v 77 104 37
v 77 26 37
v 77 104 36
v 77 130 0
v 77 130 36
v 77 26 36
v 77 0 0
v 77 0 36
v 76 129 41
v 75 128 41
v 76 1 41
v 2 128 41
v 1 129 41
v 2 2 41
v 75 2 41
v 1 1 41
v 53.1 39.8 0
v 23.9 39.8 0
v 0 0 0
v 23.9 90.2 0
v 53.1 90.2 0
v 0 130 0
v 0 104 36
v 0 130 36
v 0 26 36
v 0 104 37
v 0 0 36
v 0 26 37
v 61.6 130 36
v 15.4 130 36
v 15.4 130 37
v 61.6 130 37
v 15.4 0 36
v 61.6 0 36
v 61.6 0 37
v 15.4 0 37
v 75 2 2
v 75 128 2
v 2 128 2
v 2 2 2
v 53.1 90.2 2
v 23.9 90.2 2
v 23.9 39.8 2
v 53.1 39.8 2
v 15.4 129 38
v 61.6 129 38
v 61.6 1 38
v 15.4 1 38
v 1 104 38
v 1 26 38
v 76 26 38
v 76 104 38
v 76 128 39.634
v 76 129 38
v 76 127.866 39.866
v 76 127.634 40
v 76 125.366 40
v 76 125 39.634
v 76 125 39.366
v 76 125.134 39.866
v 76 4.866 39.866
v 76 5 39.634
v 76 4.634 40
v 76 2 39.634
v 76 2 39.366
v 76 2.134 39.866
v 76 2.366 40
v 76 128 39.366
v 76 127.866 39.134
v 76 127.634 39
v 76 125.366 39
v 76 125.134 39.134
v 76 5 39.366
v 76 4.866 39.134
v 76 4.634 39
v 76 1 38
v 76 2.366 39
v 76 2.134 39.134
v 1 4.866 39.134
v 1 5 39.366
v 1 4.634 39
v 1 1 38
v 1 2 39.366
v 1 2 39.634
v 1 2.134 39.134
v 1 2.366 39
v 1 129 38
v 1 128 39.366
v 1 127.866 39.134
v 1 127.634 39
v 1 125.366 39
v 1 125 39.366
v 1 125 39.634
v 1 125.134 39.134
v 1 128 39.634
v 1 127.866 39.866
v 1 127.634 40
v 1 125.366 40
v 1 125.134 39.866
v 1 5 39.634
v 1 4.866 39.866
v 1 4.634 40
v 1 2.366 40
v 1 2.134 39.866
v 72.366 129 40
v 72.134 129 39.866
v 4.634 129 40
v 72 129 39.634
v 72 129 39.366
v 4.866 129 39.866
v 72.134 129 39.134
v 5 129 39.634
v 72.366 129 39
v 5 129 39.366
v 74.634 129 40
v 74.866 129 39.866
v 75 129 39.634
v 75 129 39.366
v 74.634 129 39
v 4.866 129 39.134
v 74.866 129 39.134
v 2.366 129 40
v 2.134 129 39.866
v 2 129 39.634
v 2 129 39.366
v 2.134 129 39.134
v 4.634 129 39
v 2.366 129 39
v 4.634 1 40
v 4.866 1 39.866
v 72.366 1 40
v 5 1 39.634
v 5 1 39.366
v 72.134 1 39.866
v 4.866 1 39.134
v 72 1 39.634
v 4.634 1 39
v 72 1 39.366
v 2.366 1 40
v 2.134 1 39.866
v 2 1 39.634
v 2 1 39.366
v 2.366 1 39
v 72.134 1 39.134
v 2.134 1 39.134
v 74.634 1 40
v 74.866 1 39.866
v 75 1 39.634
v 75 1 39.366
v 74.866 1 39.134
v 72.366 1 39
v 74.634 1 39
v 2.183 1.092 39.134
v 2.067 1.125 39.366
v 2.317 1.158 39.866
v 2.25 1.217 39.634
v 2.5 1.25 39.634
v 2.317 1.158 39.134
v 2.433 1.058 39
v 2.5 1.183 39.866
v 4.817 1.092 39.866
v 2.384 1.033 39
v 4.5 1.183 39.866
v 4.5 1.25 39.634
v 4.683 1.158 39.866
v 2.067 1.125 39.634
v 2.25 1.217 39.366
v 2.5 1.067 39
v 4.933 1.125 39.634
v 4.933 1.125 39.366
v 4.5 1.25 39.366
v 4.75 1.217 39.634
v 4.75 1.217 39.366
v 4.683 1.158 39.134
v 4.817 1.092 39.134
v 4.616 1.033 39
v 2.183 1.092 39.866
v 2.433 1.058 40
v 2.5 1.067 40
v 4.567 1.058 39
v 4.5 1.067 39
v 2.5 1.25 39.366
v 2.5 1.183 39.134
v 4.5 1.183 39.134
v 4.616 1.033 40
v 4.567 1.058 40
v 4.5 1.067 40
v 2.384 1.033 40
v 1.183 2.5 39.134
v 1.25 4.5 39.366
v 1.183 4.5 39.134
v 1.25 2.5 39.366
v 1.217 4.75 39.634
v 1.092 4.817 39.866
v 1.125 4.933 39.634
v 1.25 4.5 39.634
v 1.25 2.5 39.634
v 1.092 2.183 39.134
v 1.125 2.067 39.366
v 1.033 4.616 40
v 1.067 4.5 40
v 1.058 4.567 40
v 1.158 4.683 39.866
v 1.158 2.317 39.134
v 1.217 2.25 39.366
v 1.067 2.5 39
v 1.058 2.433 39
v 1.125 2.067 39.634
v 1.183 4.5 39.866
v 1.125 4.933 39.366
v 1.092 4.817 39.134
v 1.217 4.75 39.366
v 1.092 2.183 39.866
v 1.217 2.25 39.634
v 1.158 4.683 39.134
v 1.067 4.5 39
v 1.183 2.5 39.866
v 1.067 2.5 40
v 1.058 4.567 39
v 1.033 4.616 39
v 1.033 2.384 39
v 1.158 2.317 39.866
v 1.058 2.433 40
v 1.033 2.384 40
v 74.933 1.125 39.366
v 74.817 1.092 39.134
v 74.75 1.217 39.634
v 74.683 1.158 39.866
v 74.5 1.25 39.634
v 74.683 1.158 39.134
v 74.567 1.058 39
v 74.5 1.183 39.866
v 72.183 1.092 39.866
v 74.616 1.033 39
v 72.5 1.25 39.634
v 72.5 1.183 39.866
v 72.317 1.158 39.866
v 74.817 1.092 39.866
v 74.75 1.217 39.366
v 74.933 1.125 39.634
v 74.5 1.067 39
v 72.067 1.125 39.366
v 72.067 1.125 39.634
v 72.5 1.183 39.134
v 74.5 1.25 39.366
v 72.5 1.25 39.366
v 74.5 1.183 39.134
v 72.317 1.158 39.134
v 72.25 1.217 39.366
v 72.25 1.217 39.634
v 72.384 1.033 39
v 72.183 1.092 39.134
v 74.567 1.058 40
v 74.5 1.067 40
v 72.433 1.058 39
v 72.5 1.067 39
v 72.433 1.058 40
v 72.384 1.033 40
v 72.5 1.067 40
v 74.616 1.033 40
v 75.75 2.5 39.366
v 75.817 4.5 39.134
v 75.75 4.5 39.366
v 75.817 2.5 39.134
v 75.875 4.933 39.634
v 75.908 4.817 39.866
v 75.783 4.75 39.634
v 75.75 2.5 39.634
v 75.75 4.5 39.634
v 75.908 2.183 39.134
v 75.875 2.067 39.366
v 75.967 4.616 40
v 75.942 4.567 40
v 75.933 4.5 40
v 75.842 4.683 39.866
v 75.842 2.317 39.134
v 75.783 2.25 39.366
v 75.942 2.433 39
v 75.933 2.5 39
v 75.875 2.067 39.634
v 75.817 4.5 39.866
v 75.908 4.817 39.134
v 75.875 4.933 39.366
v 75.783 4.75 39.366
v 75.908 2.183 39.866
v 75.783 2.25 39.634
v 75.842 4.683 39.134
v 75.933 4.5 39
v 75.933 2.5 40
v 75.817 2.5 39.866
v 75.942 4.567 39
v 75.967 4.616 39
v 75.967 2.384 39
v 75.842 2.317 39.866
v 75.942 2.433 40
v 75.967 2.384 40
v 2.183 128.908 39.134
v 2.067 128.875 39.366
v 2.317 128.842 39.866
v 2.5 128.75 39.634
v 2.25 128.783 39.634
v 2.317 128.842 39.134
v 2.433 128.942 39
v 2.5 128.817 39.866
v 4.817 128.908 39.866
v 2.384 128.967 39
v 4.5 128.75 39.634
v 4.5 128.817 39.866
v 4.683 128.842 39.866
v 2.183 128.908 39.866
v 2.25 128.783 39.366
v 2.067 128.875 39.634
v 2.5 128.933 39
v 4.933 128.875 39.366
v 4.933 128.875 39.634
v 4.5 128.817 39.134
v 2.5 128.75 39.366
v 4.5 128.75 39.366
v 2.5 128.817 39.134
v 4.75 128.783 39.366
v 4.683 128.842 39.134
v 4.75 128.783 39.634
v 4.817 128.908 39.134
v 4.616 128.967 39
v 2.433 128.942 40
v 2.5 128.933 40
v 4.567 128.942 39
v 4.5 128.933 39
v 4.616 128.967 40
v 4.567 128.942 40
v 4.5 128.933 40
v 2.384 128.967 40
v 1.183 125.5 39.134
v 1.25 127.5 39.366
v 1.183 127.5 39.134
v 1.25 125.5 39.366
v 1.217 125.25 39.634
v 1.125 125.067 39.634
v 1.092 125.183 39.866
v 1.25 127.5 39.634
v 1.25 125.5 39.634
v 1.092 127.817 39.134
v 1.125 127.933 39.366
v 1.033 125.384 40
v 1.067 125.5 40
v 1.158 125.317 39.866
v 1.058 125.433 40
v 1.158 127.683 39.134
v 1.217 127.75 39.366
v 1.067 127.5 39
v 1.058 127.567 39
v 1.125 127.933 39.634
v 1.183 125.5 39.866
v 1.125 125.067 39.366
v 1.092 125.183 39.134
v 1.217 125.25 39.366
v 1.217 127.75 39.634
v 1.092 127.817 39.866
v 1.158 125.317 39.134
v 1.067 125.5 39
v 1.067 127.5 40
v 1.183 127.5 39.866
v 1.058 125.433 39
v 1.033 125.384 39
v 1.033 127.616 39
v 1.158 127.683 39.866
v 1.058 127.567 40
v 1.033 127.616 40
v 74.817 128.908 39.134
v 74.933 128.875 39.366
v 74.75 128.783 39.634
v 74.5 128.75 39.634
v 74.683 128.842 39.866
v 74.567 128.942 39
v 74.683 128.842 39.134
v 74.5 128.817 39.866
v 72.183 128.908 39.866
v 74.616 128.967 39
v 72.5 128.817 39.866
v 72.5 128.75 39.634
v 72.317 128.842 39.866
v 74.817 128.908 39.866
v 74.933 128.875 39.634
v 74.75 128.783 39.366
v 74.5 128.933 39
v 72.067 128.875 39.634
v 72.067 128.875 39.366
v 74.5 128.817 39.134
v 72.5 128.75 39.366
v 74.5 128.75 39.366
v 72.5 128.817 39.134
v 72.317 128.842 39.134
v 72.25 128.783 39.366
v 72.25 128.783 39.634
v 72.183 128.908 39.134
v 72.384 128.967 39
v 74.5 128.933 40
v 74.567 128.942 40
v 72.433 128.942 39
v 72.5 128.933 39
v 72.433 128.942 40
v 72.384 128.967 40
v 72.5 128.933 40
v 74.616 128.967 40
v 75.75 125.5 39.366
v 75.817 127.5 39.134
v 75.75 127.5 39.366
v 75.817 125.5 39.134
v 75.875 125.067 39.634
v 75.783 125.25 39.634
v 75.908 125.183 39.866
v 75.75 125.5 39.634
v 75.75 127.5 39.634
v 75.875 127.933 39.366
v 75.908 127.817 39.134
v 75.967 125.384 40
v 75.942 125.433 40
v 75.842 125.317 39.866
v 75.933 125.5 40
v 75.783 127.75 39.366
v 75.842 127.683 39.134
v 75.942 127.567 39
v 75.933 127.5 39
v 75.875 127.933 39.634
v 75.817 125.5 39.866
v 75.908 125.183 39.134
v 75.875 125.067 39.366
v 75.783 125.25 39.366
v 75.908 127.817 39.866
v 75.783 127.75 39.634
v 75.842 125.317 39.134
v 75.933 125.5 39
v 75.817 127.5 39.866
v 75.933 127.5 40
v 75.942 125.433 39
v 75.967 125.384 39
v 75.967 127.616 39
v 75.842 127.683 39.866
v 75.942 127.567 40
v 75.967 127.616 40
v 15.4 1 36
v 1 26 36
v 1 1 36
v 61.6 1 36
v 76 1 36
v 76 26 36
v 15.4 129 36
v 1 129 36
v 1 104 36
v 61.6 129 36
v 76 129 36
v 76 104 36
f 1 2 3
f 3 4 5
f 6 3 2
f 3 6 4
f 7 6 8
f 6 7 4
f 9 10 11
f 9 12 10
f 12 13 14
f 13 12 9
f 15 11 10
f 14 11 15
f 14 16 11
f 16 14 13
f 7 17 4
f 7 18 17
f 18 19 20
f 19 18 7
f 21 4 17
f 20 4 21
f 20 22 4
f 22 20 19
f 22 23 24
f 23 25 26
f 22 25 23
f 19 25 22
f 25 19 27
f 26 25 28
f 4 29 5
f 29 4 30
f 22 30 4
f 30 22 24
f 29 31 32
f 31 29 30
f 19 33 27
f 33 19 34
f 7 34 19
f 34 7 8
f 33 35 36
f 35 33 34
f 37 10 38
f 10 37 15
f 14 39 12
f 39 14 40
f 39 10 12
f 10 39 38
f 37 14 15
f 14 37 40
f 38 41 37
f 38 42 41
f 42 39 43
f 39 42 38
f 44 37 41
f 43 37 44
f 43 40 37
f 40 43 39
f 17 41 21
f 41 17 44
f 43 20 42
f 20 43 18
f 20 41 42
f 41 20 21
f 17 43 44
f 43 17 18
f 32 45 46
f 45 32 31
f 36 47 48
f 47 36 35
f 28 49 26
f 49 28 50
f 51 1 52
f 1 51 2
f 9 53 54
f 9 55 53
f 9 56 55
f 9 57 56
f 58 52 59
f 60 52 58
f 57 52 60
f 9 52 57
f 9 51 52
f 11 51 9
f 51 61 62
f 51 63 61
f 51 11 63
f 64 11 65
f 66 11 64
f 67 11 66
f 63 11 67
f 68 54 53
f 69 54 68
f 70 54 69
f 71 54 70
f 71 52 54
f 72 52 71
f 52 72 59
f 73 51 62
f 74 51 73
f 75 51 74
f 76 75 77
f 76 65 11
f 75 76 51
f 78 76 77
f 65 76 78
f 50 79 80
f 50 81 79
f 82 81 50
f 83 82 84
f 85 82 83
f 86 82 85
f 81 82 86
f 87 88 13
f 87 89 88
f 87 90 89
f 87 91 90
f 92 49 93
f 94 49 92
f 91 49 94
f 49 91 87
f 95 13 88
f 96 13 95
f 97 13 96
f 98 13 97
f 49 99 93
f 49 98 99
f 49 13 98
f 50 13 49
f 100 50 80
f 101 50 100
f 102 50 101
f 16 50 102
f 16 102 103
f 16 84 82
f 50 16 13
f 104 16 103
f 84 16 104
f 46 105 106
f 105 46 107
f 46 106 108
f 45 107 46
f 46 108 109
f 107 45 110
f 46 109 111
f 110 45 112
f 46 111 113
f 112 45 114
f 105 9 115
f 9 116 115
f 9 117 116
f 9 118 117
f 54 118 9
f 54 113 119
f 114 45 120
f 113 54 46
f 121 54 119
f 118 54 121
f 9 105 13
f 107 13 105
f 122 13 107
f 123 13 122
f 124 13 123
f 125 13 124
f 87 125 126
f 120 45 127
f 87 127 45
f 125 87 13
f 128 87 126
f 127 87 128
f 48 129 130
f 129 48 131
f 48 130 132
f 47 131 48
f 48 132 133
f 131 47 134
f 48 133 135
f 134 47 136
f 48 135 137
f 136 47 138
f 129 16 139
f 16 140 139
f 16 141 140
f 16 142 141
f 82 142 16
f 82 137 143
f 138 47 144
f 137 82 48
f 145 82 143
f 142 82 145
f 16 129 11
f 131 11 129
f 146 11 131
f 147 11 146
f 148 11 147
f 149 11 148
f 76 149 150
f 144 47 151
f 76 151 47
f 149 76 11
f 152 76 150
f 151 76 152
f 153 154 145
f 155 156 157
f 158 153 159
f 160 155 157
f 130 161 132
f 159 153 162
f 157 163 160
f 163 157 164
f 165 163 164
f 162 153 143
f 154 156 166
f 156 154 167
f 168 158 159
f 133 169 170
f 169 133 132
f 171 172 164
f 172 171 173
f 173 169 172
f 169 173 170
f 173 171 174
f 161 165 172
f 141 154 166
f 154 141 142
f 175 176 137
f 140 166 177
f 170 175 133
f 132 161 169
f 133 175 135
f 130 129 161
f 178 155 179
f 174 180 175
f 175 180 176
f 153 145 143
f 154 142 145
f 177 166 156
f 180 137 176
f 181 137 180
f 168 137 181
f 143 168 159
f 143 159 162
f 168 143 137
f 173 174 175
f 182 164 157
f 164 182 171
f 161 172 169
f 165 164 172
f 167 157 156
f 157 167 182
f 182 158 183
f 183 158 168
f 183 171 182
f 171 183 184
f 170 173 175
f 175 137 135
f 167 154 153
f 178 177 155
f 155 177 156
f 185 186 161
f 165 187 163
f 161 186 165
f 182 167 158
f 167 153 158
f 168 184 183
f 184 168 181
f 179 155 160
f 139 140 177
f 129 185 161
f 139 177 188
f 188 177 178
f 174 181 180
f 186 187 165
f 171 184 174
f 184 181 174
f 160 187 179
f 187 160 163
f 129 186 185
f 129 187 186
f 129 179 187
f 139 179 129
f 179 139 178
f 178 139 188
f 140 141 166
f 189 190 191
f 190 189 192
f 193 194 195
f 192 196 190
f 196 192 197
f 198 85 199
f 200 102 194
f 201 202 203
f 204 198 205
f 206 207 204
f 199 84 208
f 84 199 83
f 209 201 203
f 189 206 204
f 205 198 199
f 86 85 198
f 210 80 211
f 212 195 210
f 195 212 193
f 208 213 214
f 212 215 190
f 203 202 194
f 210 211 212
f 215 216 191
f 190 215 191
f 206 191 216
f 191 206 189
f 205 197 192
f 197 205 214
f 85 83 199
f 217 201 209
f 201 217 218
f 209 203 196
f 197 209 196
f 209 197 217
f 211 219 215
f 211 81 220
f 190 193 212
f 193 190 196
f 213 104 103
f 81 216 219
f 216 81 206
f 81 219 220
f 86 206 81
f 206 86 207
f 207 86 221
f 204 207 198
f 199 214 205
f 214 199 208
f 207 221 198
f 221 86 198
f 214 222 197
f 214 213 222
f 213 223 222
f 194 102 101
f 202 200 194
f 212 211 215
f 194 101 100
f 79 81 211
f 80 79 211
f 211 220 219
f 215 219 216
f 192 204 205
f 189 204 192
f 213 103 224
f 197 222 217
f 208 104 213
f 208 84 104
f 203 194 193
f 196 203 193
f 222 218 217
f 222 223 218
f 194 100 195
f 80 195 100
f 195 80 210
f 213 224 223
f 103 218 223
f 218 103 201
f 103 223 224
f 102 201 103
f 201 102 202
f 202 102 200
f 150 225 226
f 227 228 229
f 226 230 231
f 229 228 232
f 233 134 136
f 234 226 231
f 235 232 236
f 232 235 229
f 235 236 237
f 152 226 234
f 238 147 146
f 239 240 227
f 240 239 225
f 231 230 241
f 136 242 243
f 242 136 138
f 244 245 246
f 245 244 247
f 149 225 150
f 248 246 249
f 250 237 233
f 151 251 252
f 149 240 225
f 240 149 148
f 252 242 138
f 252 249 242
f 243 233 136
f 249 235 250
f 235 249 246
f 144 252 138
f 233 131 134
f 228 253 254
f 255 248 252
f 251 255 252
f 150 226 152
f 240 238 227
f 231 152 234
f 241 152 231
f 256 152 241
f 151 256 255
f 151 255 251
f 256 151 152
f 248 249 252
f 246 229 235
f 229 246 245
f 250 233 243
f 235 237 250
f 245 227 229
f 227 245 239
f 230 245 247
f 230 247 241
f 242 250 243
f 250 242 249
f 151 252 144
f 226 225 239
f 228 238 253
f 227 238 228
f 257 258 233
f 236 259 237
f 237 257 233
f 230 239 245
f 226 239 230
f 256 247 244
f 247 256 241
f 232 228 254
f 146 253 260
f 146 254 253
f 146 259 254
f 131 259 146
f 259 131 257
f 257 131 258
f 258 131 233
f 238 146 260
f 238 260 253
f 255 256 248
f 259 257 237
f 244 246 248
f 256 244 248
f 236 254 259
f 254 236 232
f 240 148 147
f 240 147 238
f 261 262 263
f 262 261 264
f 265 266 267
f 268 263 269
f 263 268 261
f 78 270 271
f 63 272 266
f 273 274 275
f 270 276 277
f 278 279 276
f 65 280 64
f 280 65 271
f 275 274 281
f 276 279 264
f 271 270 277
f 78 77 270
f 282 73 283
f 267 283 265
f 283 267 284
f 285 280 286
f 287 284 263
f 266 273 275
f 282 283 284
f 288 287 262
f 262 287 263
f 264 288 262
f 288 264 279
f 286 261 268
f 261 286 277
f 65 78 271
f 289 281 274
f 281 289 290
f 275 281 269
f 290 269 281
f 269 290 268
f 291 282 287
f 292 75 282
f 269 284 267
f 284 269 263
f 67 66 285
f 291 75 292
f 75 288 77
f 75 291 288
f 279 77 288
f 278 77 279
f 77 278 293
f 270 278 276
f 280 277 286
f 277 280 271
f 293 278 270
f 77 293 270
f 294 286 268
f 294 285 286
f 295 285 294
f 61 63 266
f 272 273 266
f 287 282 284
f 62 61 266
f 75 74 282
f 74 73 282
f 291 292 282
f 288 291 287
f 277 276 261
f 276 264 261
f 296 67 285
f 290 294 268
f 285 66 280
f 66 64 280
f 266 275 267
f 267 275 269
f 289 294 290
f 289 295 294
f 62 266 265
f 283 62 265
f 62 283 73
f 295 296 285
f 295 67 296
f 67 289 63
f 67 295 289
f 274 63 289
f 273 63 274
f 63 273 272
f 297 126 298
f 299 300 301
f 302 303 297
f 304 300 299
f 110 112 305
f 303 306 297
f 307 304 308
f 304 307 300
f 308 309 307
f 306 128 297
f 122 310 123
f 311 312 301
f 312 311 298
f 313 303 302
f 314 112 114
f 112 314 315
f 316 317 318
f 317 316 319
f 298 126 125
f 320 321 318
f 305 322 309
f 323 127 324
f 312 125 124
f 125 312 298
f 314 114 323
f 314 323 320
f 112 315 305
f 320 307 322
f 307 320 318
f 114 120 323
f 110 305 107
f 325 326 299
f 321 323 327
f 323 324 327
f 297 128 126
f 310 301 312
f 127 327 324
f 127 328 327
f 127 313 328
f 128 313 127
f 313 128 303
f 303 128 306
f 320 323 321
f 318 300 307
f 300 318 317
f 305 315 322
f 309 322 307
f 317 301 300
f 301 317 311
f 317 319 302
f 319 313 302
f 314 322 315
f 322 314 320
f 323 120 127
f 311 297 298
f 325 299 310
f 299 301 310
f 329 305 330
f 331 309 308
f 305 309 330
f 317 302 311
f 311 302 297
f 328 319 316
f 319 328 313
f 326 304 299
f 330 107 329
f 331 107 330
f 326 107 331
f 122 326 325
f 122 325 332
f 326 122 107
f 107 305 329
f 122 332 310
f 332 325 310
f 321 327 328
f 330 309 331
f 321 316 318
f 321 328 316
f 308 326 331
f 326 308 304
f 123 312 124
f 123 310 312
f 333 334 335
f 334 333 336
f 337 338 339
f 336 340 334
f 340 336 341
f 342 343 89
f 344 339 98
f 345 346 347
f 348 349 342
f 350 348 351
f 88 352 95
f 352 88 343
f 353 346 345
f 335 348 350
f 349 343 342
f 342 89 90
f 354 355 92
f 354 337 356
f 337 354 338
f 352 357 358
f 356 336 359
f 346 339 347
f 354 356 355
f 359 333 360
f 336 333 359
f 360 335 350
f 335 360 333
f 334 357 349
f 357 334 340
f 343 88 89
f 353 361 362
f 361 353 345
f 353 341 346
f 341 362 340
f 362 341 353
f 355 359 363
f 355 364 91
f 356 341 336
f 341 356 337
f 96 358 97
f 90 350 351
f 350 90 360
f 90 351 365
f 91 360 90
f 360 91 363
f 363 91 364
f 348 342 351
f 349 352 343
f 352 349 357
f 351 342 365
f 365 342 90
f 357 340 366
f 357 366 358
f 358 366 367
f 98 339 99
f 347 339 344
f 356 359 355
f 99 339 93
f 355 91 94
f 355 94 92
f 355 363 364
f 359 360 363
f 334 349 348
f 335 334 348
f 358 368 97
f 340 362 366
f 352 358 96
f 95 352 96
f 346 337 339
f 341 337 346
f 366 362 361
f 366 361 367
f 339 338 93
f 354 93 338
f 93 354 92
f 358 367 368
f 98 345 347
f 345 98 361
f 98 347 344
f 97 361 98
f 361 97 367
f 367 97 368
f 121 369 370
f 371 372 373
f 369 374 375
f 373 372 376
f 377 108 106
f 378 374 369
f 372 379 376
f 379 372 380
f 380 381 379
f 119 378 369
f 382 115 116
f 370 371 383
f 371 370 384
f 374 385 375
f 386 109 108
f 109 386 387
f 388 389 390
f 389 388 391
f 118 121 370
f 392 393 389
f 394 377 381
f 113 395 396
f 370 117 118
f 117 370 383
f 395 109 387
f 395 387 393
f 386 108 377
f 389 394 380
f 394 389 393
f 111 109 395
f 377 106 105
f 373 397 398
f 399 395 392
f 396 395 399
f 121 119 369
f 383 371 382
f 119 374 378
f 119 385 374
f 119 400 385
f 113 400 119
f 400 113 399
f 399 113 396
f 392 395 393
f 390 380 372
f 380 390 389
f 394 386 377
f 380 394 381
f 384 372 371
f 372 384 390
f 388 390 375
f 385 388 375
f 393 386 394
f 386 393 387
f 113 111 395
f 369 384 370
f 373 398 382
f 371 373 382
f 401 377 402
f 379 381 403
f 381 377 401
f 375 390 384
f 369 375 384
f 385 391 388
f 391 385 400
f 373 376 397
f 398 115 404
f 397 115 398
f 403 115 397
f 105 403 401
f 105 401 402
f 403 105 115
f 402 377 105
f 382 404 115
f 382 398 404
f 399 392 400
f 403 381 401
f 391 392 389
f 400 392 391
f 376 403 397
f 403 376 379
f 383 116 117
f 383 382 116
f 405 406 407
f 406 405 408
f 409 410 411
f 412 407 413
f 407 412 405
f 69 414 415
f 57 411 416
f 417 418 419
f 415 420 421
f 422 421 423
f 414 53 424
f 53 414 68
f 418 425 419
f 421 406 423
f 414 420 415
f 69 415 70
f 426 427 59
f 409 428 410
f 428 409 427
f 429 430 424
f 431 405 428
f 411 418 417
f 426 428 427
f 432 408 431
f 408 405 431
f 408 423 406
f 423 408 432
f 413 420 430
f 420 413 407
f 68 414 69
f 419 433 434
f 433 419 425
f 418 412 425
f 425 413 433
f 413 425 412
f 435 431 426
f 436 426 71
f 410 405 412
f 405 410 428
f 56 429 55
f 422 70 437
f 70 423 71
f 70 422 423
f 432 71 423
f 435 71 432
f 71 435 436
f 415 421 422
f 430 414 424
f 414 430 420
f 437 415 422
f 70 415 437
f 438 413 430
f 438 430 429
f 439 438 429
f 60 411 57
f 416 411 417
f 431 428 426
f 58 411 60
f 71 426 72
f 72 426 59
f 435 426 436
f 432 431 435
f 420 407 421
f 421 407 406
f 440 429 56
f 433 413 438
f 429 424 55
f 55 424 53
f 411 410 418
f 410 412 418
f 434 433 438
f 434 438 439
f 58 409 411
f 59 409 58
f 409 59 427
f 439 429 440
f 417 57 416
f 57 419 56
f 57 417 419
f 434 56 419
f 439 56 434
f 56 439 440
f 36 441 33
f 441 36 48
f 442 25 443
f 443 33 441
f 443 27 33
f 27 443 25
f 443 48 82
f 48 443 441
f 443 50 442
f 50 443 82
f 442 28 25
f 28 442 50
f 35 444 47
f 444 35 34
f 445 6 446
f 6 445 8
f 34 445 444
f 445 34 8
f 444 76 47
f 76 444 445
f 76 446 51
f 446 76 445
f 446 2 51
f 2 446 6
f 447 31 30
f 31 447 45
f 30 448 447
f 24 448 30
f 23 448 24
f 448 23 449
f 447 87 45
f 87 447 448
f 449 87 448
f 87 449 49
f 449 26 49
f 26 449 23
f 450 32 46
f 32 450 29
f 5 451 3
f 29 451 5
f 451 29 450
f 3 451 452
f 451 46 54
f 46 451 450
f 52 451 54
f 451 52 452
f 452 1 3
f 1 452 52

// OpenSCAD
insert_font = "Futura:style=Medium";

include <../../The-Boardgame-Insert-Toolkit/boardgame_insert_toolkit_lib.2.scad>;
include <../../BFD-Insert-Extensions/InsertExtensions.scad>;

$fn = 100;


// Used to visualize how all of the boxes fit together. 
//g_b_visualization = true;          
        
// this is the outer wall thickness. 
//Default = 1.5mm
g_wall_thickness = 2.0;
g_lid_thickness = 2.0;
g_min_bottom_thickness = 1.0;


// The tolerance value is extra space put between planes of the lid and box that fit together.
// Increase the tolerance to loosen the fit and decrease it to tighten it.
//
// Note that the tolerance is applied exclusively to the lid.
// So if the lid is too tight or too loose, change this value ( up for looser fit, down for tighter fit ) and 
// you only need to reprint the lid.
// 
// The exception is the stackable box, where the bottom of the box is the lid of the box below,
// in which case the tolerance also affects that box bottom.
//
g_tolerance = 0.15;

// This adjusts the position of the lid detents downward. 
// The larger the value, the bigger the gap between the lid and the box.
g_tolerance_detents_pos = 0.1;

card_sizes = [[67,92],[73,126]];
card_width = 68;
card_height = 91;

function tents() = 
 [   "Tents",
        [
            [ BOX_SIZE_XYZ,                                     [71, 37, 7.5] ],
            boxLid(["Tents"], 10, 0, 12),
            [ BOX_COMPONENT,
                [
                    
                    [CMP_NUM_COMPARTMENTS_XY,               [1,1]],
                    [CMP_COMPARTMENT_SIZE_XYZ,              [ 33, 33, 5.5] ],
                    [CMP_SHAPE,                             SQUARE],   
                    [ POSITION_XY,                          [0, 0 ] ],
                    [CMP_CUTOUT_SIDES_4B,                   [t,f,f,f]],
                    [ LABEL,
                        [
                            [ LBL_TEXT,     "Tent" ],
                            [ LBL_SIZE,     5],
                            [ ROTATION,     0 ],
                            [ LBL_FONT,     insert_font],
                            [ POSITION_XY,   [0,0]]
                        ]
                    ], 
                ]
            ],  
            [ BOX_COMPONENT,
                [
                    
                    [CMP_NUM_COMPARTMENTS_XY,               [1,1]],
                    [CMP_COMPARTMENT_SIZE_XYZ,              [ 33, 33, 5.5] ],
                    [CMP_SHAPE,                             SQUARE],   
                    [ POSITION_XY,                          [34, 0 ] ],
                    [CMP_CUTOUT_SIDES_4B,                   [t,f,f,f]],
                    [ LABEL,
                        [
                            [ LBL_TEXT,     "Tent" ],
                            [ LBL_SIZE,     5],
                            [ ROTATION,     0 ],
                            [ LBL_FONT,     insert_font],
                            [ POSITION_XY,   [0,0]]
                        ]
                    ], 
                ]
            ],
        ]
];

function bunkhouses() = 
 [   "Bunkhouses",
        [
            [ BOX_SIZE_XYZ,                                     [71, 37, 12.5] ],
            boxLid(["Bunkhouse"], 10, 0, 12),
            [ BOX_COMPONENT,
                [
                    
                    [CMP_NUM_COMPARTMENTS_XY,               [1,1]],
                    [CMP_COMPARTMENT_SIZE_XYZ,              [ 33, 33, 10] ],
                    [CMP_SHAPE,                             SQUARE],   
                    [ POSITION_XY,                          [0, 0 ] ],
                    [CMP_CUTOUT_SIDES_4B,                   [t,f,f,f]],
                    [ LABEL,
                        [
                            [ LBL_TEXT,     "Bunkhouse" ],
                            [ LBL_SIZE,     5],
                            [ ROTATION,     -45 ],
                            [ LBL_FONT,     insert_font],
                            [ POSITION_XY,   [0,3]]
                        ]
                    ], 
                ]
            ],  
            [ BOX_COMPONENT,
                [
                    
                    [CMP_NUM_COMPARTMENTS_XY,               [1,1]],
                    [CMP_COMPARTMENT_SIZE_XYZ,              [ 33, 33, 10] ],
                    [CMP_SHAPE,                             SQUARE],   
                    [ POSITION_XY,                          [34, 0 ] ],
                    [CMP_CUTOUT_SIDES_4B,                   [t,f,f,f]],
                    [ LABEL,
                        [
                            [ LBL_TEXT,     "Bunkhouse" ],
                            [ LBL_SIZE,     5],
                            [ ROTATION,     -45 ],
                            [ LBL_FONT,     insert_font],
                            [ POSITION_XY,   [0,3]]
                        ]
                    ], 
                ]
            ],
        ]
];

function houses() = 
 [   "Houses",
        [
            [ BOX_SIZE_XYZ,                                     [71, 37, 12.5] ],
            boxLid(["Houses"], 10, 0, 12),
            [ BOX_COMPONENT,
                [
                    
                    [CMP_NUM_COMPARTMENTS_XY,               [1,1]],
                    [CMP_COMPARTMENT_SIZE_XYZ,              [ 33, 33, 10] ],
                    [CMP_SHAPE,                             SQUARE],   
                    [ POSITION_XY,                          [0, 0 ] ],
                    [CMP_CUTOUT_SIDES_4B,                   [t,f,f,f]],
                    [ LABEL,
                        [
                            [ LBL_TEXT,     "House" ],
                            [ LBL_SIZE,     5],
                            [ ROTATION,     0 ],
                            [ LBL_FONT,     insert_font],
                            [ POSITION_XY,   [0,0]]
                        ]
                    ], 
                ]
            ],  
            [ BOX_COMPONENT,
                [
                    
                    [CMP_NUM_COMPARTMENTS_XY,               [1,1]],
                    [CMP_COMPARTMENT_SIZE_XYZ,              [ 33, 33, 10] ],
                    [CMP_SHAPE,                             SQUARE],   
                    [ POSITION_XY,                          [34, 0 ] ],
                    [CMP_CUTOUT_SIDES_4B,                   [t,f,f,f]],
                    [ LABEL,
                        [
                            [ LBL_TEXT,     "House" ],
                            [ LBL_SIZE,     5],
                            [ ROTATION,     0 ],
                            [ LBL_FONT,     insert_font],
                            [ POSITION_XY,   [0,0]]
                        ]
                    ], 
                ]
            ],
        ]
];

function smallBuildings() = 
 [   "Small Buildings",
        [
            [ BOX_SIZE_XYZ,                                     [71, 139, 15] ],
            boxLid(["Small Buildings"], 10, 90, 12),
            [ BOX_COMPONENT,
                [
                    
                    [CMP_NUM_COMPARTMENTS_XY,               [1,1]],
                    [CMP_COMPARTMENT_SIZE_XYZ,              [ 33, 33, 10.5] ],
                    [CMP_SHAPE,                             SQUARE],   
                    [ POSITION_XY,                          [0, 0 ] ],
                    [CMP_CUTOUT_SIDES_4B,                   [f,f,t,f]],
                    compartmentLabel(label="Gathering",rotation = -90,position=[0,10]),
                    compartmentLabel(label="Post",rotation = -90),     
                ]
            ],  
            [ BOX_COMPONENT,
                [
                    
                    [CMP_NUM_COMPARTMENTS_XY,               [1,1]],
                    [CMP_COMPARTMENT_SIZE_XYZ,              [ 33, 33, 8] ],
                    [CMP_SHAPE,                             SQUARE],   
                    [ POSITION_XY,                          [34, 0 ] ],
                    [CMP_CUTOUT_SIDES_4B,                   [f,f,f,t]],
                    compartmentLabel(label="Medical",rotation = 90,position=[0,10]),
                    compartmentLabel(label="Post",rotation = 90),   
                ]
            ],
            [ BOX_COMPONENT,
                [
                    
                    [CMP_NUM_COMPARTMENTS_XY,               [1,1]],
                    [CMP_COMPARTMENT_SIZE_XYZ,              [ 33, 33, 13] ],
                    [CMP_SHAPE,                             SQUARE],   
                    [ POSITION_XY,                          [0, 34 ] ],
                    [CMP_CUTOUT_SIDES_4B,                   [f,f,t,f]],
                    compartmentLabel(label="Hunters",rotation = -90,position=[0,10]),
                    compartmentLabel(label="Hut",rotation = -90),   
                ]
            ],  
            [ BOX_COMPONENT,
                [
                    
                    [CMP_NUM_COMPARTMENTS_XY,               [1,1]],
                    [CMP_COMPARTMENT_SIZE_XYZ,              [ 33, 33, 8] ],
                    [CMP_SHAPE,                             SQUARE],   
                    [ POSITION_XY,                          [34, 34 ] ],
                    [CMP_CUTOUT_SIDES_4B,                   [f,f,f,t]],
                    compartmentLabel(label="Sawmill",rotation = 90),
                ]
            ], 
            [ BOX_COMPONENT,
                [
                    
                    [CMP_NUM_COMPARTMENTS_XY,               [1,1]],
                    [CMP_COMPARTMENT_SIZE_XYZ,              [ 33, 33, 8] ],
                    [CMP_SHAPE,                             SQUARE],   
                    [ POSITION_XY,                          [0, 68 ] ],
                    [CMP_CUTOUT_SIDES_4B,                   [f,f,t,f]],
                    compartmentLabel(label="Charcoal",rotation = -90,position=[0,10]),
                    compartmentLabel(label="Kiln",rotation = -90),   
                ]
            ],  
            [ BOX_COMPONENT,
                [
                    
                    [CMP_NUM_COMPARTMENTS_XY,               [1,1]],
                    [CMP_COMPARTMENT_SIZE_XYZ,              [ 33, 33, 3] ],
                    [CMP_SHAPE,                             SQUARE],   
                    [ POSITION_XY,                          [34, 68 ] ],
                    [CMP_CUTOUT_SIDES_4B,                   [f,f,f,t]],
                    compartmentLabel(label="Factory",rotation = 90),
                ]
            ],   
            [ BOX_COMPONENT,
                [
                    
                    [CMP_NUM_COMPARTMENTS_XY,               [1,1]],
                    [CMP_COMPARTMENT_SIZE_XYZ,              [ 33, 33, 5.5] ],
                    [CMP_SHAPE,                             SQUARE],   
                    [ POSITION_XY,                          [0, 102 ] ],
                    [CMP_CUTOUT_SIDES_4B,                   [f,f,t,f]],
                    compartmentLabel(label="Workshop",rotation = -90),
                ]
            ],  
        ]
];

function lawBuildings() = 
 [   "Law Buildings",
        [
            [ BOX_SIZE_XYZ,                                     [71, 139, 12.5] ],
            boxLid(["Law Buildings"], 10, 90, 12),
            [ BOX_COMPONENT,
                [
                    
                    [CMP_NUM_COMPARTMENTS_XY,               [1,1]],
                    [CMP_COMPARTMENT_SIZE_XYZ,              [ 33, 33, 5.5] ],
                    [CMP_SHAPE,                             SQUARE],   
                    [ POSITION_XY,                          [0, 0 ] ],
                    [CMP_CUTOUT_SIDES_4B,                   [f,f,t,f]],  
                ]
            ],  
            [ BOX_COMPONENT,
                [
                    
                    [CMP_NUM_COMPARTMENTS_XY,               [1,1]],
                    [CMP_COMPARTMENT_SIZE_XYZ,              [ 33, 33, 5.5] ],
                    [CMP_SHAPE,                             SQUARE],   
                    [ POSITION_XY,                          [34, 0 ] ],
                    [CMP_CUTOUT_SIDES_4B,                   [f,f,f,t]],
                ]
            ],
            [ BOX_COMPONENT,
                [
                    
                    [CMP_NUM_COMPARTMENTS_XY,               [1,1]],
                    [CMP_COMPARTMENT_SIZE_XYZ,              [ 33, 33, 3] ],
                    [CMP_SHAPE,                             SQUARE],   
                    [ POSITION_XY,                          [0, 34 ] ],
                    [CMP_CUTOUT_SIDES_4B,                   [f,f,t,f]],
                ]
            ],  
            [ BOX_COMPONENT,
                [
                    
                    [CMP_NUM_COMPARTMENTS_XY,               [1,1]],
                    [CMP_COMPARTMENT_SIZE_XYZ,              [ 33, 33, 3] ],
                    [CMP_SHAPE,                             SQUARE],   
                    [ POSITION_XY,                          [34, 34 ] ],
                    [CMP_CUTOUT_SIDES_4B,                   [f,f,f,t]],
                ]
            ], 
            [ BOX_COMPONENT,
                [
                    
                    [CMP_NUM_COMPARTMENTS_XY,               [1,1]],
                    [CMP_COMPARTMENT_SIZE_XYZ,              [ 33, 33, 10.5] ],
                    [CMP_SHAPE,                             SQUARE],   
                    [ POSITION_XY,                          [0, 68 ] ],
                    [CMP_CUTOUT_SIDES_4B,                   [f,f,t,f]],
                ]
            ],  
            [ BOX_COMPONENT,
                [
                    
                    [CMP_NUM_COMPARTMENTS_XY,               [1,1]],
                    [CMP_COMPARTMENT_SIZE_XYZ,              [ 33, 33, 3] ],
                    [CMP_SHAPE,                             SQUARE],   
                    [ POSITION_XY,                          [34, 68 ] ],
                    [CMP_CUTOUT_SIDES_4B,                   [f,f,f,t]],
                ]
            ],   
            [ BOX_COMPONENT,
                [
                    
                    [CMP_NUM_COMPARTMENTS_XY,               [1,1]],
                    [CMP_COMPARTMENT_SIZE_XYZ,              [ 65, 33, 3] ],
                    [CMP_SHAPE,                             SQUARE],   
                    [ POSITION_XY,                          [0.5, 102 ] ],
                    [CMP_CUTOUT_SIDES_4B,                   [f,f,t,t]],
                ]
            ],  
        ]
];

function scenarioBuildings() = 
 [   "Scenario Buildings",
        [
            [ BOX_SIZE_XYZ,                                     [71, 105, 12.5] ],
            boxLid(["Scenario" , "Buildings"], 10, 90, 12),
            [ BOX_COMPONENT,
                [
                    
                    [CMP_NUM_COMPARTMENTS_XY,               [1,1]],
                    [CMP_COMPARTMENT_SIZE_XYZ,              [ 33, 33, 10.5] ],
                    [CMP_SHAPE,                             SQUARE],   
                    [ POSITION_XY,                          [0, 0 ] ],
                    [CMP_CUTOUT_SIDES_4B,                   [f,f,t,f]],
                ]
            ],  
            [ BOX_COMPONENT,
                [
                    
                    [CMP_NUM_COMPARTMENTS_XY,               [1,1]],
                    [CMP_COMPARTMENT_SIZE_XYZ,              [ 33, 33, 8] ],
                    [CMP_SHAPE,                             SQUARE],   
                    [ POSITION_XY,                          [34, 0 ] ],
                    [CMP_CUTOUT_SIDES_4B,                   [f,f,f,t]],
                ]
            ], 
            [ BOX_COMPONENT,
                [
                    
                    [CMP_NUM_COMPARTMENTS_XY,               [1,1]],
                    [CMP_COMPARTMENT_SIZE_XYZ,              [ 65, 33, 8] ],
                    [CMP_SHAPE,                             SQUARE],   
                    [ POSITION_XY,                          [0.5, 34 ] ],
                    [CMP_CUTOUT_SIDES_4B,                   [f,f,t,f]],
                ]
            ],  
            [ BOX_COMPONENT,
                [
                    
                    [CMP_NUM_COMPARTMENTS_XY,               [1,1]],
                    [CMP_COMPARTMENT_SIZE_XYZ,              [ 65, 33, 10.5] ],
                    [CMP_SHAPE,                             SQUARE],   
                    [ POSITION_XY,                          [0.5, 68 ] ],
                    [CMP_CUTOUT_SIDES_4B,                   [f,f,t,f]],
                ]
            ],  
        ]
];

function destroyedBuildings() = 
 [   "Destroyed Buildings",
        [
            [ BOX_SIZE_XYZ,                                     [71, 71, 12.5] ],
            boxLid(["Destroyed","Buildings"], 9, 90, 16),
            [ BOX_COMPONENT,
                [
                    
                    [CMP_NUM_COMPARTMENTS_XY,               [1,1]],
                    [CMP_COMPARTMENT_SIZE_XYZ,              [ 33, 33, 10.5] ],
                    [CMP_SHAPE,                             SQUARE],   
                    [ POSITION_XY,                          [0, 0 ] ],
                    [CMP_CUTOUT_SIDES_4B,                   [f,f,t,f]],  
                ]
            ],  
            [ BOX_COMPONENT,
                [
                    
                    [CMP_NUM_COMPARTMENTS_XY,               [1,1]],
                    [CMP_COMPARTMENT_SIZE_XYZ,              [ 33, 33, 10.5] ],
                    [CMP_SHAPE,                             SQUARE],   
                    [ POSITION_XY,                          [34, 0 ] ],
                    [CMP_CUTOUT_SIDES_4B,                   [f,f,f,t]],
                ]
            ],
            [ BOX_COMPONENT,
                [
                    
                    [CMP_NUM_COMPARTMENTS_XY,               [1,1]],
                    [CMP_COMPARTMENT_SIZE_XYZ,              [ 33, 33, 10.5] ],
                    [CMP_SHAPE,                             SQUARE],   
                    [ POSITION_XY,                          [0, 34 ] ],
                    [CMP_CUTOUT_SIDES_4B,                   [f,f,t,f]],
                ]
            ],  
            [ BOX_COMPONENT,
                [
                    
                    [CMP_NUM_COMPARTMENTS_XY,               [1,1]],
                    [CMP_COMPARTMENT_SIZE_XYZ,              [ 33, 33, 8] ],
                    [CMP_SHAPE,                             SQUARE],   
                    [ POSITION_XY,                          [34, 34 ] ],
                    [CMP_CUTOUT_SIDES_4B,                   [f,f,f,t]],
                ]
            ], 
        ]
];

function largeBuildings() = 
 [   "Large Buildings",
        [
            [ BOX_SIZE_XYZ,                                     [105, 135, 7.5] ],
            boxLid(["Large Buildings"], 10, 90, 12),
            [ BOX_COMPONENT,
                [
                    
                    [CMP_NUM_COMPARTMENTS_XY,               [1,1]],
                    [CMP_COMPARTMENT_SIZE_XYZ,              [ 33, 65, 5.5] ],
                    [CMP_SHAPE,                             SQUARE],   
                    [ POSITION_XY,                          [0, 0 ] ],
                    [CMP_CUTOUT_SIDES_4B,                   [t,f,f,f]],
                    compartmentLabel(label="Coal",size=8,rotation = 90,position=[8,6]),
                    compartmentLabel(label="Thumper",size=8,rotation = 90,position=[8,-6]),   
                ]
            ],  
            [ BOX_COMPONENT,
                [
                    
                    [CMP_NUM_COMPARTMENTS_XY,               [1,1]],
                    [CMP_COMPARTMENT_SIZE_XYZ,              [ 33, 65, 5.5] ],
                    [CMP_SHAPE,                             SQUARE],   
                    [ POSITION_XY,                          [34, 0 ] ],
                    [CMP_CUTOUT_SIDES_4B,                   [t,f,f,f]],
                    compartmentLabel(label="Hothouse",size=8,rotation = 90,position=[8,0]),
                ]
            ],
            [ BOX_COMPONENT,
                [
                    
                    [CMP_NUM_COMPARTMENTS_XY,               [1,1]],
                    [CMP_COMPARTMENT_SIZE_XYZ,              [ 33, 65, 5.5] ],
                    [CMP_SHAPE,                             SQUARE],   
                    [ POSITION_XY,                          [68, 0 ] ],
                    [CMP_CUTOUT_SIDES_4B,                   [t,f,f,f]],
                    compartmentLabel(label="Wall",size=8,rotation = 90,position=[8,6]),
                    compartmentLabel(label="Drill",size=8,rotation = 90,position=[8,-6]), 
                ]
            ], 
           [ BOX_COMPONENT,
                [
                    
                    [CMP_NUM_COMPARTMENTS_XY,               [1,1]],
                    [CMP_COMPARTMENT_SIZE_XYZ,              [ 33, 65, 3] ],
                    [CMP_SHAPE,                             SQUARE],   
                    [ POSITION_XY,                          [0, 66 ] ],
                    [CMP_CUTOUT_SIDES_4B,                   [f,t,f,f]],
                    compartmentLabel(label="Beacon",size=8,rotation = 90,position=[-8,0]),
                ]
            ],  
            [ BOX_COMPONENT,
                [
                    
                    [CMP_NUM_COMPARTMENTS_XY,               [1,1]],
                    [CMP_COMPARTMENT_SIZE_XYZ,              [ 33, 65, 5.5] ],
                    [CMP_SHAPE,                             SQUARE],   
                    [ POSITION_XY,                          [34, 66 ] ],
                    [CMP_CUTOUT_SIDES_4B,                   [f,t,f,f]],
                    compartmentLabel(label="Infirmary",size=8,rotation = 90,position=[-8,0]),
                ]
            ],
            [ BOX_COMPONENT,
                [
                    
                    [CMP_NUM_COMPARTMENTS_XY,               [1,1]],
                    [CMP_COMPARTMENT_SIZE_XYZ,              [ 33, 65, 5.5] ],
                    [CMP_SHAPE,                             SQUARE],   
                    [ POSITION_XY,                          [68, 66 ] ],
                    [CMP_CUTOUT_SIDES_4B,                   [f,t,f,f]],
                    compartmentLabel(label="Coal",size=8,rotation = 90,position=[-8,6]),
                    compartmentLabel(label="Mine",size=8,rotation = 90,position=[-8,-6]), 
                ]
            ],   
        ]
];

function boardHexes() = 
 [   "Board Hexes",
        [
            [ BOX_SIZE_XYZ,                                     [193.5, 157, 25.5] ],
            boxLid(["Board Hexes","Other Cardboard Tokens"], 10, 0, 12),
            [ BOX_COMPONENT,
                [
                    
                    [CMP_NUM_COMPARTMENTS_XY,               [1,1]],
                    [CMP_COMPARTMENT_SIZE_XYZ,              [ 87, 87, 23.5] ],
                    [CMP_SHAPE,                             HEX],
                    [CMP_SHAPE_VERTICAL_B,                  t],    
                    [ POSITION_XY,                          [-5, 0 ] ],
                    [CMP_CUTOUT_BOTTOM_B,                   t]
                ]
            ],  
            [ BOX_COMPONENT,
                [
                    
                    [CMP_NUM_COMPARTMENTS_XY,               [1,1]],
                    [CMP_COMPARTMENT_SIZE_XYZ,              [ 87, 87, 23.5] ],
                    [CMP_SHAPE,                             HEX],
                    [CMP_SHAPE_VERTICAL_B,                  t],    
                    [ POSITION_XY,                          [70.3, 0 ] ],
                    [CMP_CUTOUT_BOTTOM_B,                   t]
                ]
            ], 
            [ BOX_COMPONENT,
                [
                    
                    [CMP_NUM_COMPARTMENTS_XY,               [1,1]],
                    [CMP_COMPARTMENT_SIZE_XYZ,              [ 87, 87, 23.5] ],
                    [CMP_SHAPE,                             HEX],
                    [CMP_SHAPE_VERTICAL_B,                  t],    
                    [ POSITION_XY,                          [32.65, 65.25 ] ],
                    [CMP_CUTOUT_BOTTOM_B,                   t]
                ]
            ],
            [ BOX_COMPONENT,
                [
                    
                    [CMP_NUM_COMPARTMENTS_XY,               [1,1]],
                    [CMP_COMPARTMENT_SIZE_XYZ,              [ 87, 87, 23.5] ],
                    [CMP_SHAPE,                             HEX],
                    [CMP_SHAPE_VERTICAL_B,                  t],    
                    [ POSITION_XY,                          [70.3+32.65+5, 65.25 ] ],
                    [CMP_CUTOUT_BOTTOM_B,                   t]
                ]
            ],         
            [ BOX_COMPONENT,
                [
                    
                    [CMP_NUM_COMPARTMENTS_XY,               [1,1]],
                    [CMP_COMPARTMENT_SIZE_XYZ,              [ 15.5, 15.5, 13] ],
                    [CMP_SHAPE,                             ROUND],
                    [CMP_SHAPE_VERTICAL_B,                  t],    
                    [CMP_PADDING_XY,                        [2,2]],
                    [ POSITION_XY,                          [ 25, 137.5] ],   
                    [CMP_CUTOUT_TYPE,                       EXTERIOR],
                    [CMP_CUTOUT_SIDES_4B,                   [f,t,f,f]],   
                ]
            ], 
            [ BOX_COMPONENT,
                [
                    
                    [CMP_NUM_COMPARTMENTS_XY,               [1,1]],
                    [CMP_COMPARTMENT_SIZE_XYZ,              [ 15.5, 15.5, 15.5] ],
                    [CMP_SHAPE,                             SQUARE],
                    [CMP_SHAPE_VERTICAL_B,                  t],    
                    [CMP_PADDING_XY,                        [2,2]],
                    [ POSITION_XY,                          [ 69, 0] ],   
                    [CMP_CUTOUT_TYPE,                       EXTERIOR],
                    [CMP_CUTOUT_SIDES_4B,                   [t,f,f,f]],    
                ]
            ],
            [ BOX_COMPONENT,
                [
                    
                    [CMP_NUM_COMPARTMENTS_XY,               [1,1]],
                    [CMP_COMPARTMENT_SIZE_XYZ,              [ 15, 15, 18] ],
                    [CMP_SHAPE,                             SQUARE],
                    [CMP_SHAPE_VERTICAL_B,                  t],    
                    [CMP_PADDING_XY,                        [2,2]],
                    [ POSITION_XY,                          [ 106.5, 138] ],   
                    [CMP_CUTOUT_TYPE,                       EXTERIOR],
                    [CMP_CUTOUT_SIDES_4B,                   [f,t,f,f]],    
                ]
            ],  
            [ BOX_COMPONENT,
                [
                    
                    [CMP_NUM_COMPARTMENTS_XY,               [1,1]],
                    [CMP_COMPARTMENT_SIZE_XYZ,              [ 21, 21, 18] ],
                    [CMP_SHAPE,                             ROUND],
                    [CMP_SHAPE_VERTICAL_B,                  t],    
                    [CMP_PADDING_XY,                        [2,2]],
                    [ POSITION_XY,                          [ 0, 73.5] ],   
                    [CMP_CUTOUT_TYPE,                       EXTERIOR],
                    [CMP_CUTOUT_SIDES_4B,                   [f,f,t,f]],    
                ]
            ], 
            [ BOX_COMPONENT,
                [
                    
                    [CMP_NUM_COMPARTMENTS_XY,               [1,1]],
                    [CMP_COMPARTMENT_SIZE_XYZ,              [ 21, 21, 13] ],
                    [CMP_SHAPE,                             ROUND],
                    [CMP_SHAPE_VERTICAL_B,                  t],    
                    [CMP_PADDING_XY,                        [2,2]],
                    [ POSITION_XY,                          [ 0, 95.5] ],   
                    [CMP_CUTOUT_TYPE,                       EXTERIOR],
                    [CMP_CUTOUT_SIDES_4B,                   [f,f,t,f]],    
                ]
            ],
            [ BOX_COMPONENT,
                [
                    
                    [CMP_NUM_COMPARTMENTS_XY,               [1,1]],
                    [CMP_COMPARTMENT_SIZE_XYZ,              [ 21.5, 21.5, 13] ],
                    [CMP_SHAPE,                             SQUARE],
                    [CMP_SHAPE_VERTICAL_B,                  t],    
                    [CMP_PADDING_XY,                        [2,2]],
                    [ POSITION_XY,                          [ 0, 118] ],   
                    [CMP_CUTOUT_TYPE,                       EXTERIOR],
                    [CMP_CUTOUT_SIDES_4B,                   [f,f,t,f]],    
                ]
            ],
            [ BOX_COMPONENT,
                [
                    
                    [CMP_NUM_COMPARTMENTS_XY,               [1,1]],
                    [CMP_COMPARTMENT_SIZE_XYZ,              [ 28, 28, 10.5] ],
                    [CMP_SHAPE,                             HEX],
                    [CMP_SHAPE_VERTICAL_B,                  t],    
                    [CMP_PADDING_XY,                        [2,2]],
                    [ POSITION_XY,                          [ 163, 45] ],   
                    [CMP_CUTOUT_TYPE,                       EXTERIOR],
                    [CMP_CUTOUT_SIDES_4B,                   [f,f,f,t]],    
                ]
            ],
            [ BOX_COMPONENT,
                [
                    
                    [CMP_NUM_COMPARTMENTS_XY,               [1,1]],
                    [CMP_COMPARTMENT_SIZE_XYZ,              [ 30.5, 16, 10.5] ],
                    [CMP_SHAPE,                             SQUARE],
                    [CMP_SHAPE_VERTICAL_B,                  t],    
                    [CMP_PADDING_XY,                        [2,2]],
                    [ POSITION_XY,                          [ 159, 23] ],   
                    [CMP_CUTOUT_TYPE,                       EXTERIOR],
                    [CMP_CUTOUT_SIDES_4B,                   [f,f,f,t]],    
                ]
            ],  
            [ BOX_COMPONENT,
                [
                    
                    [CMP_NUM_COMPARTMENTS_XY,               [1,1]],
                    [CMP_COMPARTMENT_SIZE_XYZ,              [ 21, 21, 21] ],
                    [CMP_SHAPE,                             ROUND],
                    [CMP_SHAPE_VERTICAL_B,                  t],    
                    [CMP_PADDING_XY,                        [2,2]],
                    [ POSITION_XY,                          [ 168.5, 0] ],   
                    [CMP_CUTOUT_TYPE,                       EXTERIOR],
                    [CMP_CUTOUT_SIDES_4B,                   [t,f,f,f]],   
                ]
            ],    
            [ BOX_COMPONENT,
                [
                    
                    [CMP_NUM_COMPARTMENTS_XY,               [1,1]],
                    [CMP_COMPARTMENT_SIZE_XYZ,              [ 21, 21, 18.5] ],
                    [CMP_SHAPE,                             ROUND],
                    [CMP_SHAPE_VERTICAL_B,                  t],    
                    [CMP_PADDING_XY,                        [2,2]],
                    [ POSITION_XY,                          [ 146, 0] ],   
                    [CMP_CUTOUT_TYPE,                       EXTERIOR],
                    [CMP_CUTOUT_SIDES_4B,                   [t,f,f,f]],   
                ]
            ],   
        ]
   ];

function housingHolder() = 
[   "Housing Holder",
    [
        [ BOX_SIZE_XYZ,                                     [151, 75.5, 3] ],
        [ BOX_NO_LID_B,t],
        [ BOX_COMPONENT,
            [
                
                [CMP_NUM_COMPARTMENTS_XY,               [1,1]],
                [CMP_COMPARTMENT_SIZE_XYZ,              [ 37.5, 71.5, 1] ],
                [CMP_SHAPE,                             SQUARE],   
                [ POSITION_XY,                          [0, 0 ] ],
            ]
        ], 
        [ BOX_COMPONENT,
            [
                
                [CMP_NUM_COMPARTMENTS_XY,               [1,1]],
                [CMP_COMPARTMENT_SIZE_XYZ,              [ 15, 71.5, 2] ],
                [CMP_SHAPE,                             SQUARE],   
                [ POSITION_XY,                          [38.5, 0 ] ],
                [CMP_CUTOUT_BOTTOM_B,t],
                [CMP_CUTOUT_BOTTOM_PCT,100],
            ]
        ],   
        [ BOX_COMPONENT,
            [
                
                [CMP_NUM_COMPARTMENTS_XY,               [1,1]],
                [CMP_COMPARTMENT_SIZE_XYZ,              [ 37.5, 71.5, 1] ],
                [CMP_SHAPE,                             SQUARE],   
                [ POSITION_XY,                          [CENTER, 0 ] ],
            ]
        ],
        [ BOX_COMPONENT,
            [
                
                [CMP_NUM_COMPARTMENTS_XY,               [1,1]],
                [CMP_COMPARTMENT_SIZE_XYZ,              [ 15, 71.5, 2] ],
                [CMP_SHAPE,                             SQUARE],   
                [ POSITION_XY,                          [93.5, 0 ] ],
                [CMP_CUTOUT_BOTTOM_B,t],
                [CMP_CUTOUT_BOTTOM_PCT,100],
            ]
        ],   
        [ BOX_COMPONENT,
            [
                
                [CMP_NUM_COMPARTMENTS_XY,               [1,1]],
                [CMP_COMPARTMENT_SIZE_XYZ,              [ 37.5, 71.5, 1] ],
                [CMP_SHAPE,                             SQUARE],   
                [ POSITION_XY,                          [109.5, 0 ] ],
            ]
        ],
    ]
];

function mapBorder() = 
[   "Map Border",
    [
        [ BOX_SIZE_XYZ,                                     [304, 68, 28] ],
        [ BOX_NO_LID_B,t],
        [ BOX_COMPONENT,
            [
                
                [CMP_NUM_COMPARTMENTS_XY,               [1,1]],
                [CMP_COMPARTMENT_SIZE_XYZ,              [ 300, 64, 26] ],
                [CMP_SHAPE,                             SQUARE],   
                [ POSITION_XY,                          [0, 0 ] ],
            ]
        ], 
    ],
];

function resinResources() =
    [   "Resin Resources",
        [
            [ BOX_SIZE_XYZ, [149,77,15 ]], 
            boxLid(["Resin","Resources"], 12, 0, 12),
            bowlCompartment(1,59,73,16,pos_x = 0, pos_y = 0), 
            bowlCompartment(1,40,40,16,pos_x = 60, pos_y = 0),
            bowlCompartment(1,40,32,16,pos_x = 60, pos_y = 41),
            bowlCompartment(1,44,73,16,pos_x = 101, pos_y = 0),        
        ]
    ];
    
function woodenResources() =
    [   "Wooden Resources",
        [
            [ BOX_SIZE_XYZ, [118,77,27 ]], 
            boxLid(["Wooden","Resources"], 12, 0, 12),
            bowlCompartment(1,56,73,25,pos_x = 0, pos_y = 0,r=12), 
            bowlCompartment(1,57,42,25,pos_x = 57, pos_y = 0,r=12),
            bowlCompartment(1,57,30,25,pos_x = 57, pos_y = 43,r=12),      
        ]
    ];

// Focus on one box
g_isolated_print_box = "Dusk"; 
g_b_print_lid = false;
g_b_print_box = true; 

data =
[
    cardBox("Laws",["Laws"],32,"",20,card=1),
    cardBox("Morning",["Morning"],22,"",20,card=1),
    cardBox("Society",["Society","Social Dispute"],18,"",8,card=1),
    cardBox("Dusk",["Dusk"],39,"",20,card=1),
    cardBox("Scenarios",["Scenarios"],25,"",18,card=1),
    cardBox("Weather",["Weather"],8,"",14,card=0),
    cardBox("Citizens",["Citizens"],20,"",14,card=0),
    cardBox("Technologies",["Technologies"],11,"",10,card=0),
    cardBox("Expeditions",["Expeditions"],24,"",10,card=0),
    box( "Hope And Discontent", 1, ["Hope &","Discontent"], 8, 0, 60, 60, 31, "", f),
    bowl("Resin Trees", 1, ["Resin","Trees"],15, 90, 73, 96, 25, ""),
    bowl("Bowl Test", 1, ["Testing"],15, 90, 50, 50, 15, ""),
    box( "Wooden Markers", 1, ["Wooden","Markers"], 8, 0, 76, 50, 20, "", f),
    bowl("Stress Markers", 1, ["Wooden Coal/","Stress Markers"], 7, 0, 76, 47, 20, ""),
    bowl("Wooden Trees", 1, ["Wooden","Trees"], 12, 90, 67, 75, 41, "",radius=20),
    box( "Wooden Citizens", 1, ["Wooden Citizens"], 8, 0, 131, 51, 20, "", f),
    box( "Wooden Automatons", 1, ["Wooden","Automatons"], 8, 0, 88, 54.5, 23.5, "", f),
    spacer("Spacer 1", 105, 55, 22),
    spacer("Spacer 2", 101, 45, 34.5),
    boardHexes(),
    smallBuildings(),
    largeBuildings(),
    tents(),
    bunkhouses(),
    houses(),
    lawBuildings(),
    destroyedBuildings(),
    scenarioBuildings(),
    housingHolder(),
    resinResources(),
    woodenResources(),
    mapBorder(),
];

MakeAll();
